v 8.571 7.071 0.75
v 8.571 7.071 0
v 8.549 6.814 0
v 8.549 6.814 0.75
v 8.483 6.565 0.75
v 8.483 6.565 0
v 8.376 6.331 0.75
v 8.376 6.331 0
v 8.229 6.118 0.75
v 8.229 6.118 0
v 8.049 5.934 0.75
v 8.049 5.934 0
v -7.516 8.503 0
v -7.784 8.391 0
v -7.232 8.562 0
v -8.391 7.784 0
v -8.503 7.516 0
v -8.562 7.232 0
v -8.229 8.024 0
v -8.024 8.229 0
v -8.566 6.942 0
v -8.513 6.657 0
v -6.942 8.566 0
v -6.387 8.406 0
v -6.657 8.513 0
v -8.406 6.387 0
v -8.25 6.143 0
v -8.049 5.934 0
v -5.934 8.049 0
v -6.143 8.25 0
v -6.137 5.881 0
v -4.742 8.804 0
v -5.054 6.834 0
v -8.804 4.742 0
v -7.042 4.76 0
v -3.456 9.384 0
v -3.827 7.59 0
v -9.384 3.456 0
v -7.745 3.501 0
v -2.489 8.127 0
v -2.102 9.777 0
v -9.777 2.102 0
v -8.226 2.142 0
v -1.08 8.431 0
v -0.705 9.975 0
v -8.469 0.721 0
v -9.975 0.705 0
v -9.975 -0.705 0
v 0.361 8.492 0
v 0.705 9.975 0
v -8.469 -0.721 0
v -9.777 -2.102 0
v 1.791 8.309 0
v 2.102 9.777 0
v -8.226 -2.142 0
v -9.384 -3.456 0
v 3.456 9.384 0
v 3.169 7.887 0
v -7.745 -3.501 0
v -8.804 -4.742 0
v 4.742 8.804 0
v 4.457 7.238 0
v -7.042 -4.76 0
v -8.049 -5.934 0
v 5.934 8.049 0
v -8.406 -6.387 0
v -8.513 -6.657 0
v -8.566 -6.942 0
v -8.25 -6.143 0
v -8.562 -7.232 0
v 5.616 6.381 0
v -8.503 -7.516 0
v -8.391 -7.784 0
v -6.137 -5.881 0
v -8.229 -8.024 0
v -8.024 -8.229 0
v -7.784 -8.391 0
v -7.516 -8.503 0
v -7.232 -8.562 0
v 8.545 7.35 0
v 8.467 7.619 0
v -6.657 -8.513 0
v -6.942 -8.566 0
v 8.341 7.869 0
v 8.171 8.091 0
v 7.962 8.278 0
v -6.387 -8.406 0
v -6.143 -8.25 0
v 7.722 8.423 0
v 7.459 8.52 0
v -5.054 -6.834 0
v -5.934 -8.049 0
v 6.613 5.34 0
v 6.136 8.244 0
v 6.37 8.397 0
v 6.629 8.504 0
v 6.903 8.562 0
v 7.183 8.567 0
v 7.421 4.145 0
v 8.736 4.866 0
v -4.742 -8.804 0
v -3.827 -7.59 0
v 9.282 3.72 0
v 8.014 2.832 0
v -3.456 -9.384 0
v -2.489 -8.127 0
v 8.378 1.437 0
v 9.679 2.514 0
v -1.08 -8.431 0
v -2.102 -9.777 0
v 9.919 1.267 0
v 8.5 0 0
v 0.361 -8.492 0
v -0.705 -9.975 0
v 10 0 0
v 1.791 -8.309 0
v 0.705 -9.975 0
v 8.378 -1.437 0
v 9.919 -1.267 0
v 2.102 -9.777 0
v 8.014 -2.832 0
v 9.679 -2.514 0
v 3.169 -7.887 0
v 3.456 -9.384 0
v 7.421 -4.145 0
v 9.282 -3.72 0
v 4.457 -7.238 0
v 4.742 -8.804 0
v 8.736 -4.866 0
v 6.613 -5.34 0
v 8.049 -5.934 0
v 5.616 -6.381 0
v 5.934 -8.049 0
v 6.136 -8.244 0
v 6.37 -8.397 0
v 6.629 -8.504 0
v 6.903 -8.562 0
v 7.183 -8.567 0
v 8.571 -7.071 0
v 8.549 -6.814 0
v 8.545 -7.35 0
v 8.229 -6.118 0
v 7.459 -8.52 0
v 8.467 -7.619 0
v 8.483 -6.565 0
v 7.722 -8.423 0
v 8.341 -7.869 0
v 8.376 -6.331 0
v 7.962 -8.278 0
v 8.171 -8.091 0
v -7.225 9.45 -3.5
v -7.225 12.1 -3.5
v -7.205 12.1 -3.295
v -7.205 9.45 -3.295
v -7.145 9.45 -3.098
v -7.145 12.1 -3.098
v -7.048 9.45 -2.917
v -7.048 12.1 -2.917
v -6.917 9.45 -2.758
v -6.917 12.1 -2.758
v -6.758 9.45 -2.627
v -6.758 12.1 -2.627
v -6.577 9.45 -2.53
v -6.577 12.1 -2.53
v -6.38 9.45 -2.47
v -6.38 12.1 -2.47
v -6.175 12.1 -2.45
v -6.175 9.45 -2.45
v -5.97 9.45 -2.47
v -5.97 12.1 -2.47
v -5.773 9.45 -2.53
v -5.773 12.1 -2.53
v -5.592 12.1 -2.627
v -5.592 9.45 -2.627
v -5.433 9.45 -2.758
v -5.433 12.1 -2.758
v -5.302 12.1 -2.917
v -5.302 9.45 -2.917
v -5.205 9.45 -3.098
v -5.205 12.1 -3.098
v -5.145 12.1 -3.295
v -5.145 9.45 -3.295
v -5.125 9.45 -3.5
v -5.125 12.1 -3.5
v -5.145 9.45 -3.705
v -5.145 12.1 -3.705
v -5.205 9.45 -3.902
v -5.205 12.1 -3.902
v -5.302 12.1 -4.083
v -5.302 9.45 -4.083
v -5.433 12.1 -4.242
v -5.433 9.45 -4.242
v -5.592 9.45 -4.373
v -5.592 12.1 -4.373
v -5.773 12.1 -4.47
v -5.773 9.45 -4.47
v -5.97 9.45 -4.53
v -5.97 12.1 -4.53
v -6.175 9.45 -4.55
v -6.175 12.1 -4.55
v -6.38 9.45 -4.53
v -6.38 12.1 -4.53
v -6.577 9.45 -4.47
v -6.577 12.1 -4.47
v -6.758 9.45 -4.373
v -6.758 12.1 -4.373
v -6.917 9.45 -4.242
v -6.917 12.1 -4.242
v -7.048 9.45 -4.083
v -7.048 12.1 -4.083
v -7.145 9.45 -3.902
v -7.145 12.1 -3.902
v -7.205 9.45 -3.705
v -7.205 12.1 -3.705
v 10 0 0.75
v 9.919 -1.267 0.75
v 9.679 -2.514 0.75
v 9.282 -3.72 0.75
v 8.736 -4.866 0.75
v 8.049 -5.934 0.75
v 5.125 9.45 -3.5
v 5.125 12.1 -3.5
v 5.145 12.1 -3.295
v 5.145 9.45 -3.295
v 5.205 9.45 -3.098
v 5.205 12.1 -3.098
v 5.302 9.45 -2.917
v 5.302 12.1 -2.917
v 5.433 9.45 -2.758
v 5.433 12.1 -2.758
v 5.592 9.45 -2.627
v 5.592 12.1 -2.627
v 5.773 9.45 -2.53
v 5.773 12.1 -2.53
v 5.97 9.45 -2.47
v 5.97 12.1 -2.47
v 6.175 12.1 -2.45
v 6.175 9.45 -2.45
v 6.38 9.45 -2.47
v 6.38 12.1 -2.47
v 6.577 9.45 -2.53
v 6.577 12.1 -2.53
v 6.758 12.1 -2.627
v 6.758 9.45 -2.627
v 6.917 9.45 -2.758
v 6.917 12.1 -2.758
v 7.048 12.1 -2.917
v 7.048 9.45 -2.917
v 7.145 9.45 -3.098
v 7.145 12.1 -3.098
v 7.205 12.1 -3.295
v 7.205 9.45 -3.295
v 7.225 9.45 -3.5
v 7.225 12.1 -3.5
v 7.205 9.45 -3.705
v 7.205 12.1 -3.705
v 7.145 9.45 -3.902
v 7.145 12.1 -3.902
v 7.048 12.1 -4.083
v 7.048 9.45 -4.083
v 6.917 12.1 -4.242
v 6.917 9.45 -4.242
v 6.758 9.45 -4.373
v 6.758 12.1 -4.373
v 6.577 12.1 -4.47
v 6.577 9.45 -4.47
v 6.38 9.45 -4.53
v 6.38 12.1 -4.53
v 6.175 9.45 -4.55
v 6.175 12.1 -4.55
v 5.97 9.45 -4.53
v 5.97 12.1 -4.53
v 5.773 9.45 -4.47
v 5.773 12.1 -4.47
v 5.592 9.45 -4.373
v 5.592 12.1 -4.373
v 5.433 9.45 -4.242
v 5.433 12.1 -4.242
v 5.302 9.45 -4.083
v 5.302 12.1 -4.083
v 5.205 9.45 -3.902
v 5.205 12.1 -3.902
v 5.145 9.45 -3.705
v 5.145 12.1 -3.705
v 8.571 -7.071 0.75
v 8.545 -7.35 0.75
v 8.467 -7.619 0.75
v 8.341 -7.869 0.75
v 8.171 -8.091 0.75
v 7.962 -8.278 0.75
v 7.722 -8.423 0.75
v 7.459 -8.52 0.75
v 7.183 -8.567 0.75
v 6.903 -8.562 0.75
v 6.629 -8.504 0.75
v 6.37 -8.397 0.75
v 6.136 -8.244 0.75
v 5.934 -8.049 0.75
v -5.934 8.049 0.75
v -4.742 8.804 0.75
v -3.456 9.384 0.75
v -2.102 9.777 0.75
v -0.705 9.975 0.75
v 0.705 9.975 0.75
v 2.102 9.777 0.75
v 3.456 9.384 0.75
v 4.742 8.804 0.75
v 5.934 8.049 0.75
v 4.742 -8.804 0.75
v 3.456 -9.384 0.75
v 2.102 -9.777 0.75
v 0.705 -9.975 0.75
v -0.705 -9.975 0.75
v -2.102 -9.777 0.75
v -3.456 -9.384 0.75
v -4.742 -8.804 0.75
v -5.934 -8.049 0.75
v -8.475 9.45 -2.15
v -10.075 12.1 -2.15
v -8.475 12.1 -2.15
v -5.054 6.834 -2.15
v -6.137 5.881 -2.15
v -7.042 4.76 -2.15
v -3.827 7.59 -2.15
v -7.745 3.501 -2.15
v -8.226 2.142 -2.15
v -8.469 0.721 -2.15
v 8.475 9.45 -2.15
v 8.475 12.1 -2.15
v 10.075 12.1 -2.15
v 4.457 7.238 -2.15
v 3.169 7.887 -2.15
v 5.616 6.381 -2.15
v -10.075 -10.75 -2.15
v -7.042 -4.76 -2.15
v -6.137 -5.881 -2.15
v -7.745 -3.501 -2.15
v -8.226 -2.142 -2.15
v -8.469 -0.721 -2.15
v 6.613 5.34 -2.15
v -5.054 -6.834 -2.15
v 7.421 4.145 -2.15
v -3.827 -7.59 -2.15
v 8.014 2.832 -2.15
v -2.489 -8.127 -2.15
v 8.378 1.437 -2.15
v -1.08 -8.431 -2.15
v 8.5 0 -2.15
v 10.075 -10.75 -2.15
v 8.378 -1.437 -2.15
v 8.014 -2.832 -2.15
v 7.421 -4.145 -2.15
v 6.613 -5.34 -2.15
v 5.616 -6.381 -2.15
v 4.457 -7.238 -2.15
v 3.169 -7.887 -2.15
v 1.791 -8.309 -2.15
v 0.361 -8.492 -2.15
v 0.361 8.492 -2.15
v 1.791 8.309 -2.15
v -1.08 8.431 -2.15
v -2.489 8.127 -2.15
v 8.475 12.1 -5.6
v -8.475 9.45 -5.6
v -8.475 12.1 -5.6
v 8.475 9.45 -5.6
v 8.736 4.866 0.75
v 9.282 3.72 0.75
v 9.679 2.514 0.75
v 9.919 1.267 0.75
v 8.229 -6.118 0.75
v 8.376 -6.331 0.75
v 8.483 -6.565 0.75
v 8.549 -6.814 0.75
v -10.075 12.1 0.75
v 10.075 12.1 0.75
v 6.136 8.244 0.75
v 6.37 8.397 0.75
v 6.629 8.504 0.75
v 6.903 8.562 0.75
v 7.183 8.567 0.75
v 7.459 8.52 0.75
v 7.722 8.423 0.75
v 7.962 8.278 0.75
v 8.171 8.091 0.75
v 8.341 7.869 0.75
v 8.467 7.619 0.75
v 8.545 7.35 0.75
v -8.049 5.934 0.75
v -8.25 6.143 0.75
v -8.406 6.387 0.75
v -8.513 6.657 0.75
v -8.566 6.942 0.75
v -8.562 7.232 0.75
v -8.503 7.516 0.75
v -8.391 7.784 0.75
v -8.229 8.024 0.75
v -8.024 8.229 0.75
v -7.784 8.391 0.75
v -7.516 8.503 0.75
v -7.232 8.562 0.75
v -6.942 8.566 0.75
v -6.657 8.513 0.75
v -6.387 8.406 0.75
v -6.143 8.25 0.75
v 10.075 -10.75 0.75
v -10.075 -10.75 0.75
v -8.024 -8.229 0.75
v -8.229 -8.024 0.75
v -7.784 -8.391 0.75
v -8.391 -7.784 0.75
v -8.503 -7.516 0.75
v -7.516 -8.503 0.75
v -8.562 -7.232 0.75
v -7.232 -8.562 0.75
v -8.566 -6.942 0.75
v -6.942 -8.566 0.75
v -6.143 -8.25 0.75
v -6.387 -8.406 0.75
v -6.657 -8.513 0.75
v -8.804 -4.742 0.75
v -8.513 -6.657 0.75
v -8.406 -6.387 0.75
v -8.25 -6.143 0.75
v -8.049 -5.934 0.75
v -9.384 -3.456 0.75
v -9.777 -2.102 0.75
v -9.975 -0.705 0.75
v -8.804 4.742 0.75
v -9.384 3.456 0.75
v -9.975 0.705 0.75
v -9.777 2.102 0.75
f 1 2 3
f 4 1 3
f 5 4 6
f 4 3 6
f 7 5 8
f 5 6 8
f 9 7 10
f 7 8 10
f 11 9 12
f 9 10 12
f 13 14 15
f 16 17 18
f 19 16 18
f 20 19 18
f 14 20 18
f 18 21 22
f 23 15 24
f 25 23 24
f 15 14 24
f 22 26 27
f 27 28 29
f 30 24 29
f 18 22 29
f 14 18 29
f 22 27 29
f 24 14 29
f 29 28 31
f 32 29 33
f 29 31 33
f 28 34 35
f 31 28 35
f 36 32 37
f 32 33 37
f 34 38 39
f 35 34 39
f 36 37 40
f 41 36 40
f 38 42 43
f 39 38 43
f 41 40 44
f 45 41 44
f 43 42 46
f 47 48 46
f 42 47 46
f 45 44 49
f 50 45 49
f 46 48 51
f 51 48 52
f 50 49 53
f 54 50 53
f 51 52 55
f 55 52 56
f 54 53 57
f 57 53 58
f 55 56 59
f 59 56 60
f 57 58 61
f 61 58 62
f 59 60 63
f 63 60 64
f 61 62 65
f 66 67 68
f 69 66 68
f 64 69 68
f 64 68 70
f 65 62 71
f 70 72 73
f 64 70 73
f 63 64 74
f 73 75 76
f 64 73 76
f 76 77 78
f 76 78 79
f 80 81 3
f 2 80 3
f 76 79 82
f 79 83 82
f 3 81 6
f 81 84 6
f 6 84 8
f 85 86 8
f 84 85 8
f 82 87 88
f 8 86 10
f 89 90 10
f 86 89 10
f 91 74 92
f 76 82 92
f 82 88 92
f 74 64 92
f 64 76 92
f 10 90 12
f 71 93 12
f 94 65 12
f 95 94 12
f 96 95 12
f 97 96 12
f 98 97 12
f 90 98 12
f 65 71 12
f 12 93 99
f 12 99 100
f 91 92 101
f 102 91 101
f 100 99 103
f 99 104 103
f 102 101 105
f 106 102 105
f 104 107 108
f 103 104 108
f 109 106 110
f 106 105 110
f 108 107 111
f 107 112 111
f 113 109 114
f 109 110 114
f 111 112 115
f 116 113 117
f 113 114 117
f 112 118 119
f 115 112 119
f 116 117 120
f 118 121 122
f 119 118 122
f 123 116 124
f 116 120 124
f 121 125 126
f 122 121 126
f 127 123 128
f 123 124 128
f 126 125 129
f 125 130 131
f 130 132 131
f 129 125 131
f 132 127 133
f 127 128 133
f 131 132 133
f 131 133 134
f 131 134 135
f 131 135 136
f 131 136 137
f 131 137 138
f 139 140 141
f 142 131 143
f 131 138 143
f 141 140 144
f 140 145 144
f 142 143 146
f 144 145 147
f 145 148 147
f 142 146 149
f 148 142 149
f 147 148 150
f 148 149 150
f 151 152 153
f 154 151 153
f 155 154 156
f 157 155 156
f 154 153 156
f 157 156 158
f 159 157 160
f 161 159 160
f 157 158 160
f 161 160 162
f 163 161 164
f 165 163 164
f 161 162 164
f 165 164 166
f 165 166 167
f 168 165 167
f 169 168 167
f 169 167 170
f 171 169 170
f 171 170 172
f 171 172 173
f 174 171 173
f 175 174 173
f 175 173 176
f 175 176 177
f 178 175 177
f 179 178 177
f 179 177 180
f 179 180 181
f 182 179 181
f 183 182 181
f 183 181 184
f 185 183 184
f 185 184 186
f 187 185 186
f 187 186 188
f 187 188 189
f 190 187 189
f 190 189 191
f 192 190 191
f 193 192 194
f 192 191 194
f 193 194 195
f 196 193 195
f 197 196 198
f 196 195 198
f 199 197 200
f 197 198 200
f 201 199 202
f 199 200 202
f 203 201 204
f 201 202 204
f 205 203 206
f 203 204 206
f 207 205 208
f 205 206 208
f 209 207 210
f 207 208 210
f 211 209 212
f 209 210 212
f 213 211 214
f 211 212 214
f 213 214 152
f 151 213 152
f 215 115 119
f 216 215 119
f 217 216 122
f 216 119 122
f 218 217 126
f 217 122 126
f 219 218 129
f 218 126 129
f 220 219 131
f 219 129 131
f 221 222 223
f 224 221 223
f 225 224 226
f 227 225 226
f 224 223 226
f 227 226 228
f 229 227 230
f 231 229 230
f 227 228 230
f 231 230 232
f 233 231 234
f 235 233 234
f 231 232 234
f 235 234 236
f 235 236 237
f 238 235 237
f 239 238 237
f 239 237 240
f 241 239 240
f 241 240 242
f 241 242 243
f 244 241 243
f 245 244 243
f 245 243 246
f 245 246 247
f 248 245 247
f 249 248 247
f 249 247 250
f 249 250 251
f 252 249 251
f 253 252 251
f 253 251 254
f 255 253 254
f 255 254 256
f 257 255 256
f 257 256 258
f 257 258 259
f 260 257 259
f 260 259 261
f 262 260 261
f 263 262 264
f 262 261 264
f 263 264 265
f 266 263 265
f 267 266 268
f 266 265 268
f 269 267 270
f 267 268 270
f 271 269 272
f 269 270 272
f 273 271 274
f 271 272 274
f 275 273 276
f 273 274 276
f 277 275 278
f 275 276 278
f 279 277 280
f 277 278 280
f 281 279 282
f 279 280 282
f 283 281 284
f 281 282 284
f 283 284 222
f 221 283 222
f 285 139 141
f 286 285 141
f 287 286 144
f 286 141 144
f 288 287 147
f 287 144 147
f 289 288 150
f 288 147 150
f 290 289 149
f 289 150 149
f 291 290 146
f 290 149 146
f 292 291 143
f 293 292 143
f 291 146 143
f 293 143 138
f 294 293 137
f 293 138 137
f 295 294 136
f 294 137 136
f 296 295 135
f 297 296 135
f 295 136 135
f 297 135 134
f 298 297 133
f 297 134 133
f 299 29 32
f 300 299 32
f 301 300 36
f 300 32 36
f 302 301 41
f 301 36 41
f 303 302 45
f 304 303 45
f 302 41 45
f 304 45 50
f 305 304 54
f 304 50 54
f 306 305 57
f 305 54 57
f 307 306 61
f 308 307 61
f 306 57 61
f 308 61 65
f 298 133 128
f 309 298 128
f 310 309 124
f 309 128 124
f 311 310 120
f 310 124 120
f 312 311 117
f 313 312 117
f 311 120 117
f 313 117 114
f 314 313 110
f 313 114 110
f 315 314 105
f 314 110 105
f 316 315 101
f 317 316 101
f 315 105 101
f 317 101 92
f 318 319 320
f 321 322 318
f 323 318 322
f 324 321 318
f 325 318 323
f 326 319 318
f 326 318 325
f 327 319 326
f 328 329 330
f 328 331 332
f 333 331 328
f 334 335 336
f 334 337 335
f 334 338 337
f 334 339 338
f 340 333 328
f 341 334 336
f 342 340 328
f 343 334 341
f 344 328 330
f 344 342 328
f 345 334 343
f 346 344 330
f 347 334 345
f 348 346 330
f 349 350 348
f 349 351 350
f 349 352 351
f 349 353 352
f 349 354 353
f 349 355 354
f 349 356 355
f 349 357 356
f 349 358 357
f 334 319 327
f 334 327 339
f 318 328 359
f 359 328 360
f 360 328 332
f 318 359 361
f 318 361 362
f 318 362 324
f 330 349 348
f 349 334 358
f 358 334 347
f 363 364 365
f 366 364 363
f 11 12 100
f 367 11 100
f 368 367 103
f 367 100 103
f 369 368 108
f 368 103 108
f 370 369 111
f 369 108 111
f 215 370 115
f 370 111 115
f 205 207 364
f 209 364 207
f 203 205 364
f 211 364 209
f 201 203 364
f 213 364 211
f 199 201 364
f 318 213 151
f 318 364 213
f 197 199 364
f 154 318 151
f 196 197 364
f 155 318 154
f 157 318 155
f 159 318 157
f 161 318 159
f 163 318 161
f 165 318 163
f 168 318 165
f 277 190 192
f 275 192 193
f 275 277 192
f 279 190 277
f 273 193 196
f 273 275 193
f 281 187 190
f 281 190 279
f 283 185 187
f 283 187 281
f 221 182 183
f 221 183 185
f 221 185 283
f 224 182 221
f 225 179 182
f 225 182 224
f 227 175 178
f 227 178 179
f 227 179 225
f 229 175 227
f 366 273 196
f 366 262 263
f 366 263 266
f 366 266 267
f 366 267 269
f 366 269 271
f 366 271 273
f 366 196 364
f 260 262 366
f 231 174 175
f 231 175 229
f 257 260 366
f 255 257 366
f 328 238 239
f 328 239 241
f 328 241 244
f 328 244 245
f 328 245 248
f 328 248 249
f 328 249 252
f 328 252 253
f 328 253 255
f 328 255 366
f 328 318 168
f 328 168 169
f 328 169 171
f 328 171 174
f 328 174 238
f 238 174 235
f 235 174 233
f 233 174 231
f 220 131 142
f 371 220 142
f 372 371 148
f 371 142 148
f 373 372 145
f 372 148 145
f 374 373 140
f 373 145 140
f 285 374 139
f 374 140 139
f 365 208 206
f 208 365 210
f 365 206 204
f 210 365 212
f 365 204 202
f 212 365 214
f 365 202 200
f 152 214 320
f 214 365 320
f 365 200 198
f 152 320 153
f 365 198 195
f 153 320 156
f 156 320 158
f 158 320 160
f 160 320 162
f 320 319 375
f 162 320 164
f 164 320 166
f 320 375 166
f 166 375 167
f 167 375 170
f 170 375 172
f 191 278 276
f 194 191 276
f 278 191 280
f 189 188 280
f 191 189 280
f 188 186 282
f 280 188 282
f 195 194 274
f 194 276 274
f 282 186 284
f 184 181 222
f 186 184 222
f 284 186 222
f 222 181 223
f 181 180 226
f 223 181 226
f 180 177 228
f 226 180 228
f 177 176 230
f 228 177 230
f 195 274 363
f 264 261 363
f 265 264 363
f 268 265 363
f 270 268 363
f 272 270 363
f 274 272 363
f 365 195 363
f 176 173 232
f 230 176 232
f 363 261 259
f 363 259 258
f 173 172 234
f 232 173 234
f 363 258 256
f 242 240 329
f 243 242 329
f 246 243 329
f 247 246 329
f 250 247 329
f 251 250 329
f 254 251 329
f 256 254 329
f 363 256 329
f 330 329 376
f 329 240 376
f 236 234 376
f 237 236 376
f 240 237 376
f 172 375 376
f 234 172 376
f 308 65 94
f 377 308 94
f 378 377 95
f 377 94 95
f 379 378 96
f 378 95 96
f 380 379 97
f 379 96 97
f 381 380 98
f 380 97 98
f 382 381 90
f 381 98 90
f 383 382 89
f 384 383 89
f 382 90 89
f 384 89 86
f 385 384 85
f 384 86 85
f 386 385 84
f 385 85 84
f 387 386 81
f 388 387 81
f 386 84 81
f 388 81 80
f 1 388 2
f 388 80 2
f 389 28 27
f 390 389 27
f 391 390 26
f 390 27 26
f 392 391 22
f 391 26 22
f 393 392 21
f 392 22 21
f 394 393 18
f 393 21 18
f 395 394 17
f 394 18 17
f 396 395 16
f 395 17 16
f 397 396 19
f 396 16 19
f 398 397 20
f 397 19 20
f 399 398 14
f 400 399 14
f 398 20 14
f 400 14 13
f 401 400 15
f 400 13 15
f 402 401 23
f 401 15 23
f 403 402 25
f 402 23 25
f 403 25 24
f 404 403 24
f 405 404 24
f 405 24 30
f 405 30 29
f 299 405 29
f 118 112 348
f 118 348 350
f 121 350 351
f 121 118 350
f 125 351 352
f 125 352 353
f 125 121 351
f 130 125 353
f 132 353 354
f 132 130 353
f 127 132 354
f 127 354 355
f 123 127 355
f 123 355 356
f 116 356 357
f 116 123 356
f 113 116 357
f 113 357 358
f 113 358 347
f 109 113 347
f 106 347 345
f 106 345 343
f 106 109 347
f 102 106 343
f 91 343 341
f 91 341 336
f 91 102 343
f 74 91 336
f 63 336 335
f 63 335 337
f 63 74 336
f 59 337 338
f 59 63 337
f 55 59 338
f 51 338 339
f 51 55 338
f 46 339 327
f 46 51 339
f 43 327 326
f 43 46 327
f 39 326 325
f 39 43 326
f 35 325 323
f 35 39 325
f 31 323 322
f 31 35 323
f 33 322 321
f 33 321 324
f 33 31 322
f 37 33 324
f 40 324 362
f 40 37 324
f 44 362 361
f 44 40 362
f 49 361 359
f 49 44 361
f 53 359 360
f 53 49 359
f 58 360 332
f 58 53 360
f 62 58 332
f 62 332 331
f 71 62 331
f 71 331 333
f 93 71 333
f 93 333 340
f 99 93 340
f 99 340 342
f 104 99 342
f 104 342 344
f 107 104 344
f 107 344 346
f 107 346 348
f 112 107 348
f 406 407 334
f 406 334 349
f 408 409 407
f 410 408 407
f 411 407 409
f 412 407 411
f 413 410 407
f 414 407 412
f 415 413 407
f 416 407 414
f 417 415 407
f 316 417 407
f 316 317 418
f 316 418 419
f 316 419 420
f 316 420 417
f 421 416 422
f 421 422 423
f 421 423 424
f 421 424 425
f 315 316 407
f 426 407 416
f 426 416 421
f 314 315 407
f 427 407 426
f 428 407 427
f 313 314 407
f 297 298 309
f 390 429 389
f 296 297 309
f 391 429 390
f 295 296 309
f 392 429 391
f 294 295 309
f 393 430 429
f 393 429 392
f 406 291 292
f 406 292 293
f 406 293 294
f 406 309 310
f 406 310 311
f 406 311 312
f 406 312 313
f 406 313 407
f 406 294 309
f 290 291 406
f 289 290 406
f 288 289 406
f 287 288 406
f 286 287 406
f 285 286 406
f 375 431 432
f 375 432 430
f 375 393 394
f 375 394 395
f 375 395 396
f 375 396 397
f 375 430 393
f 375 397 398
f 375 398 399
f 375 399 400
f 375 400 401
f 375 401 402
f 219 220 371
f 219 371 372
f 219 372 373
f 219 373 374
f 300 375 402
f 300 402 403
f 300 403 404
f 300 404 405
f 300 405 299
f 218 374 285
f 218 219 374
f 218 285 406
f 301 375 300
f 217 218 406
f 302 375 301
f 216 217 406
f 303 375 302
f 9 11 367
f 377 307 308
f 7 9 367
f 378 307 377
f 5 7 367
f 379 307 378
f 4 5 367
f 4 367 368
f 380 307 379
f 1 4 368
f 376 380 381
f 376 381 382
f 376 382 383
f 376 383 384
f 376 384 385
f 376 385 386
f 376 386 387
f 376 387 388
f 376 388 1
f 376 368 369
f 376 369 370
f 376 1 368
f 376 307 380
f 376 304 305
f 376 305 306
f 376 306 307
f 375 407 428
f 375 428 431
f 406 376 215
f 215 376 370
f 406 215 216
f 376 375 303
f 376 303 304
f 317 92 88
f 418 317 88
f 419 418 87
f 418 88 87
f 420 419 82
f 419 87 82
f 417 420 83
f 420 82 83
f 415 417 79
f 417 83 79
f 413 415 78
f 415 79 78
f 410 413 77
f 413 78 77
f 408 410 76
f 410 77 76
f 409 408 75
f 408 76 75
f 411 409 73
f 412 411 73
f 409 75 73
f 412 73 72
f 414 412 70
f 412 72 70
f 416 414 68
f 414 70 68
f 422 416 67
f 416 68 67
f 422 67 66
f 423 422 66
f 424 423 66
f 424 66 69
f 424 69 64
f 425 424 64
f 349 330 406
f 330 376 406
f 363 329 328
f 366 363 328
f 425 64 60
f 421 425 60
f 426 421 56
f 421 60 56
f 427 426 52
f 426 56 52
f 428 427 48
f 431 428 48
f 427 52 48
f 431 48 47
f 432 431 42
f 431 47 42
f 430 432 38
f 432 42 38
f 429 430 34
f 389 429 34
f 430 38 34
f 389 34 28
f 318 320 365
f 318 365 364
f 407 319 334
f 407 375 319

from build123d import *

# Parameters (mm, degrees)
F0_W     = 20.15
F0_H     = 22.85
F1_DEPTH = 0.75
F2_W     = 20.15
F2_H     = 22.85
F2_R     = 8.5
F3_DEPTH = 2.15
F4_W     = 16.95
F4_H     = 2.65
F5_DEPTH = 3.45
F6_R     = 1.05
F7_DEPTH = 22.851


with BuildPart() as f1:
    # F0 (on Top) → F1 (new body)
    with BuildSketch(Plane.XY):
        with Locations((0, 0.675)):
            Rectangle(F0_W, F0_H)
        with BuildLine():
            ThreePointArc((8.049191, 5.933845), (9.499787, 3.123147), (10, 0))
            ThreePointArc((10, 0), (9.499787, -3.123147), (8.049191, -5.933845))
            ThreePointArc((8.049191, -5.933845), (8.43437, -6.445442), (8.571068, -7.071068))
            ThreePointArc((8.571068, -7.071068), (7.592684, -8.477452), (5.933845, -8.049191))
            ThreePointArc((5.933845, -8.049191), (0, -10), (-5.933845, -8.049191))
            ThreePointArc((-5.933845, -8.049191), (-8.131728, -8.131728), (-8.049191, -5.933845))
            ThreePointArc((-8.049191, -5.933845), (-10, 0), (-8.049191, 5.933845))
            ThreePointArc((-8.049191, 5.933845), (-8.131728, 8.131728), (-5.933845, 8.049191))
            ThreePointArc((-5.933845, 8.049191), (0, 10), (5.933845, 8.049191))
            ThreePointArc((5.933845, 8.049191), (7.592684, 8.477452), (8.571068, 7.071068))
            ThreePointArc((8.571068, 7.071068), (8.43437, 6.445442), (8.049191, 5.933845))
        make_face(mode=Mode.SUBTRACT)
    extrude(amount=F1_DEPTH)

    # F2 (on face) → F3 (join)
    with BuildSketch(Plane(origin=(0, 0, 0), x_dir=(1, 0, 0), z_dir=(0, 0, -1))):
        with Locations((0, -0.675)):
            Rectangle(F2_W, F2_H)
        Circle(F2_R, mode=Mode.SUBTRACT)
    extrude(amount=F3_DEPTH)

    # F4 (on face) → F5 (join)
    with BuildSketch(Plane(origin=(0, 0, -2.15), x_dir=(1, 0, 0), z_dir=(0, 0, -1))):
        with Locations((0, -10.775)):
            Rectangle(F4_W, F4_H)
    extrude(amount=F5_DEPTH)

    # F6 (on face) → F7 (cut, through all)
    with BuildSketch(Plane(origin=(0, 12.1, 0), x_dir=(-1, 0, 0), z_dir=(0, 1, 0))):
        with Locations((-6.175, -3.5)):
            Circle(F6_R)
        with Locations((6.175, -3.5)):
            Circle(F6_R)
    extrude(amount=-F7_DEPTH, mode=Mode.SUBTRACT)


solid = f1.part
